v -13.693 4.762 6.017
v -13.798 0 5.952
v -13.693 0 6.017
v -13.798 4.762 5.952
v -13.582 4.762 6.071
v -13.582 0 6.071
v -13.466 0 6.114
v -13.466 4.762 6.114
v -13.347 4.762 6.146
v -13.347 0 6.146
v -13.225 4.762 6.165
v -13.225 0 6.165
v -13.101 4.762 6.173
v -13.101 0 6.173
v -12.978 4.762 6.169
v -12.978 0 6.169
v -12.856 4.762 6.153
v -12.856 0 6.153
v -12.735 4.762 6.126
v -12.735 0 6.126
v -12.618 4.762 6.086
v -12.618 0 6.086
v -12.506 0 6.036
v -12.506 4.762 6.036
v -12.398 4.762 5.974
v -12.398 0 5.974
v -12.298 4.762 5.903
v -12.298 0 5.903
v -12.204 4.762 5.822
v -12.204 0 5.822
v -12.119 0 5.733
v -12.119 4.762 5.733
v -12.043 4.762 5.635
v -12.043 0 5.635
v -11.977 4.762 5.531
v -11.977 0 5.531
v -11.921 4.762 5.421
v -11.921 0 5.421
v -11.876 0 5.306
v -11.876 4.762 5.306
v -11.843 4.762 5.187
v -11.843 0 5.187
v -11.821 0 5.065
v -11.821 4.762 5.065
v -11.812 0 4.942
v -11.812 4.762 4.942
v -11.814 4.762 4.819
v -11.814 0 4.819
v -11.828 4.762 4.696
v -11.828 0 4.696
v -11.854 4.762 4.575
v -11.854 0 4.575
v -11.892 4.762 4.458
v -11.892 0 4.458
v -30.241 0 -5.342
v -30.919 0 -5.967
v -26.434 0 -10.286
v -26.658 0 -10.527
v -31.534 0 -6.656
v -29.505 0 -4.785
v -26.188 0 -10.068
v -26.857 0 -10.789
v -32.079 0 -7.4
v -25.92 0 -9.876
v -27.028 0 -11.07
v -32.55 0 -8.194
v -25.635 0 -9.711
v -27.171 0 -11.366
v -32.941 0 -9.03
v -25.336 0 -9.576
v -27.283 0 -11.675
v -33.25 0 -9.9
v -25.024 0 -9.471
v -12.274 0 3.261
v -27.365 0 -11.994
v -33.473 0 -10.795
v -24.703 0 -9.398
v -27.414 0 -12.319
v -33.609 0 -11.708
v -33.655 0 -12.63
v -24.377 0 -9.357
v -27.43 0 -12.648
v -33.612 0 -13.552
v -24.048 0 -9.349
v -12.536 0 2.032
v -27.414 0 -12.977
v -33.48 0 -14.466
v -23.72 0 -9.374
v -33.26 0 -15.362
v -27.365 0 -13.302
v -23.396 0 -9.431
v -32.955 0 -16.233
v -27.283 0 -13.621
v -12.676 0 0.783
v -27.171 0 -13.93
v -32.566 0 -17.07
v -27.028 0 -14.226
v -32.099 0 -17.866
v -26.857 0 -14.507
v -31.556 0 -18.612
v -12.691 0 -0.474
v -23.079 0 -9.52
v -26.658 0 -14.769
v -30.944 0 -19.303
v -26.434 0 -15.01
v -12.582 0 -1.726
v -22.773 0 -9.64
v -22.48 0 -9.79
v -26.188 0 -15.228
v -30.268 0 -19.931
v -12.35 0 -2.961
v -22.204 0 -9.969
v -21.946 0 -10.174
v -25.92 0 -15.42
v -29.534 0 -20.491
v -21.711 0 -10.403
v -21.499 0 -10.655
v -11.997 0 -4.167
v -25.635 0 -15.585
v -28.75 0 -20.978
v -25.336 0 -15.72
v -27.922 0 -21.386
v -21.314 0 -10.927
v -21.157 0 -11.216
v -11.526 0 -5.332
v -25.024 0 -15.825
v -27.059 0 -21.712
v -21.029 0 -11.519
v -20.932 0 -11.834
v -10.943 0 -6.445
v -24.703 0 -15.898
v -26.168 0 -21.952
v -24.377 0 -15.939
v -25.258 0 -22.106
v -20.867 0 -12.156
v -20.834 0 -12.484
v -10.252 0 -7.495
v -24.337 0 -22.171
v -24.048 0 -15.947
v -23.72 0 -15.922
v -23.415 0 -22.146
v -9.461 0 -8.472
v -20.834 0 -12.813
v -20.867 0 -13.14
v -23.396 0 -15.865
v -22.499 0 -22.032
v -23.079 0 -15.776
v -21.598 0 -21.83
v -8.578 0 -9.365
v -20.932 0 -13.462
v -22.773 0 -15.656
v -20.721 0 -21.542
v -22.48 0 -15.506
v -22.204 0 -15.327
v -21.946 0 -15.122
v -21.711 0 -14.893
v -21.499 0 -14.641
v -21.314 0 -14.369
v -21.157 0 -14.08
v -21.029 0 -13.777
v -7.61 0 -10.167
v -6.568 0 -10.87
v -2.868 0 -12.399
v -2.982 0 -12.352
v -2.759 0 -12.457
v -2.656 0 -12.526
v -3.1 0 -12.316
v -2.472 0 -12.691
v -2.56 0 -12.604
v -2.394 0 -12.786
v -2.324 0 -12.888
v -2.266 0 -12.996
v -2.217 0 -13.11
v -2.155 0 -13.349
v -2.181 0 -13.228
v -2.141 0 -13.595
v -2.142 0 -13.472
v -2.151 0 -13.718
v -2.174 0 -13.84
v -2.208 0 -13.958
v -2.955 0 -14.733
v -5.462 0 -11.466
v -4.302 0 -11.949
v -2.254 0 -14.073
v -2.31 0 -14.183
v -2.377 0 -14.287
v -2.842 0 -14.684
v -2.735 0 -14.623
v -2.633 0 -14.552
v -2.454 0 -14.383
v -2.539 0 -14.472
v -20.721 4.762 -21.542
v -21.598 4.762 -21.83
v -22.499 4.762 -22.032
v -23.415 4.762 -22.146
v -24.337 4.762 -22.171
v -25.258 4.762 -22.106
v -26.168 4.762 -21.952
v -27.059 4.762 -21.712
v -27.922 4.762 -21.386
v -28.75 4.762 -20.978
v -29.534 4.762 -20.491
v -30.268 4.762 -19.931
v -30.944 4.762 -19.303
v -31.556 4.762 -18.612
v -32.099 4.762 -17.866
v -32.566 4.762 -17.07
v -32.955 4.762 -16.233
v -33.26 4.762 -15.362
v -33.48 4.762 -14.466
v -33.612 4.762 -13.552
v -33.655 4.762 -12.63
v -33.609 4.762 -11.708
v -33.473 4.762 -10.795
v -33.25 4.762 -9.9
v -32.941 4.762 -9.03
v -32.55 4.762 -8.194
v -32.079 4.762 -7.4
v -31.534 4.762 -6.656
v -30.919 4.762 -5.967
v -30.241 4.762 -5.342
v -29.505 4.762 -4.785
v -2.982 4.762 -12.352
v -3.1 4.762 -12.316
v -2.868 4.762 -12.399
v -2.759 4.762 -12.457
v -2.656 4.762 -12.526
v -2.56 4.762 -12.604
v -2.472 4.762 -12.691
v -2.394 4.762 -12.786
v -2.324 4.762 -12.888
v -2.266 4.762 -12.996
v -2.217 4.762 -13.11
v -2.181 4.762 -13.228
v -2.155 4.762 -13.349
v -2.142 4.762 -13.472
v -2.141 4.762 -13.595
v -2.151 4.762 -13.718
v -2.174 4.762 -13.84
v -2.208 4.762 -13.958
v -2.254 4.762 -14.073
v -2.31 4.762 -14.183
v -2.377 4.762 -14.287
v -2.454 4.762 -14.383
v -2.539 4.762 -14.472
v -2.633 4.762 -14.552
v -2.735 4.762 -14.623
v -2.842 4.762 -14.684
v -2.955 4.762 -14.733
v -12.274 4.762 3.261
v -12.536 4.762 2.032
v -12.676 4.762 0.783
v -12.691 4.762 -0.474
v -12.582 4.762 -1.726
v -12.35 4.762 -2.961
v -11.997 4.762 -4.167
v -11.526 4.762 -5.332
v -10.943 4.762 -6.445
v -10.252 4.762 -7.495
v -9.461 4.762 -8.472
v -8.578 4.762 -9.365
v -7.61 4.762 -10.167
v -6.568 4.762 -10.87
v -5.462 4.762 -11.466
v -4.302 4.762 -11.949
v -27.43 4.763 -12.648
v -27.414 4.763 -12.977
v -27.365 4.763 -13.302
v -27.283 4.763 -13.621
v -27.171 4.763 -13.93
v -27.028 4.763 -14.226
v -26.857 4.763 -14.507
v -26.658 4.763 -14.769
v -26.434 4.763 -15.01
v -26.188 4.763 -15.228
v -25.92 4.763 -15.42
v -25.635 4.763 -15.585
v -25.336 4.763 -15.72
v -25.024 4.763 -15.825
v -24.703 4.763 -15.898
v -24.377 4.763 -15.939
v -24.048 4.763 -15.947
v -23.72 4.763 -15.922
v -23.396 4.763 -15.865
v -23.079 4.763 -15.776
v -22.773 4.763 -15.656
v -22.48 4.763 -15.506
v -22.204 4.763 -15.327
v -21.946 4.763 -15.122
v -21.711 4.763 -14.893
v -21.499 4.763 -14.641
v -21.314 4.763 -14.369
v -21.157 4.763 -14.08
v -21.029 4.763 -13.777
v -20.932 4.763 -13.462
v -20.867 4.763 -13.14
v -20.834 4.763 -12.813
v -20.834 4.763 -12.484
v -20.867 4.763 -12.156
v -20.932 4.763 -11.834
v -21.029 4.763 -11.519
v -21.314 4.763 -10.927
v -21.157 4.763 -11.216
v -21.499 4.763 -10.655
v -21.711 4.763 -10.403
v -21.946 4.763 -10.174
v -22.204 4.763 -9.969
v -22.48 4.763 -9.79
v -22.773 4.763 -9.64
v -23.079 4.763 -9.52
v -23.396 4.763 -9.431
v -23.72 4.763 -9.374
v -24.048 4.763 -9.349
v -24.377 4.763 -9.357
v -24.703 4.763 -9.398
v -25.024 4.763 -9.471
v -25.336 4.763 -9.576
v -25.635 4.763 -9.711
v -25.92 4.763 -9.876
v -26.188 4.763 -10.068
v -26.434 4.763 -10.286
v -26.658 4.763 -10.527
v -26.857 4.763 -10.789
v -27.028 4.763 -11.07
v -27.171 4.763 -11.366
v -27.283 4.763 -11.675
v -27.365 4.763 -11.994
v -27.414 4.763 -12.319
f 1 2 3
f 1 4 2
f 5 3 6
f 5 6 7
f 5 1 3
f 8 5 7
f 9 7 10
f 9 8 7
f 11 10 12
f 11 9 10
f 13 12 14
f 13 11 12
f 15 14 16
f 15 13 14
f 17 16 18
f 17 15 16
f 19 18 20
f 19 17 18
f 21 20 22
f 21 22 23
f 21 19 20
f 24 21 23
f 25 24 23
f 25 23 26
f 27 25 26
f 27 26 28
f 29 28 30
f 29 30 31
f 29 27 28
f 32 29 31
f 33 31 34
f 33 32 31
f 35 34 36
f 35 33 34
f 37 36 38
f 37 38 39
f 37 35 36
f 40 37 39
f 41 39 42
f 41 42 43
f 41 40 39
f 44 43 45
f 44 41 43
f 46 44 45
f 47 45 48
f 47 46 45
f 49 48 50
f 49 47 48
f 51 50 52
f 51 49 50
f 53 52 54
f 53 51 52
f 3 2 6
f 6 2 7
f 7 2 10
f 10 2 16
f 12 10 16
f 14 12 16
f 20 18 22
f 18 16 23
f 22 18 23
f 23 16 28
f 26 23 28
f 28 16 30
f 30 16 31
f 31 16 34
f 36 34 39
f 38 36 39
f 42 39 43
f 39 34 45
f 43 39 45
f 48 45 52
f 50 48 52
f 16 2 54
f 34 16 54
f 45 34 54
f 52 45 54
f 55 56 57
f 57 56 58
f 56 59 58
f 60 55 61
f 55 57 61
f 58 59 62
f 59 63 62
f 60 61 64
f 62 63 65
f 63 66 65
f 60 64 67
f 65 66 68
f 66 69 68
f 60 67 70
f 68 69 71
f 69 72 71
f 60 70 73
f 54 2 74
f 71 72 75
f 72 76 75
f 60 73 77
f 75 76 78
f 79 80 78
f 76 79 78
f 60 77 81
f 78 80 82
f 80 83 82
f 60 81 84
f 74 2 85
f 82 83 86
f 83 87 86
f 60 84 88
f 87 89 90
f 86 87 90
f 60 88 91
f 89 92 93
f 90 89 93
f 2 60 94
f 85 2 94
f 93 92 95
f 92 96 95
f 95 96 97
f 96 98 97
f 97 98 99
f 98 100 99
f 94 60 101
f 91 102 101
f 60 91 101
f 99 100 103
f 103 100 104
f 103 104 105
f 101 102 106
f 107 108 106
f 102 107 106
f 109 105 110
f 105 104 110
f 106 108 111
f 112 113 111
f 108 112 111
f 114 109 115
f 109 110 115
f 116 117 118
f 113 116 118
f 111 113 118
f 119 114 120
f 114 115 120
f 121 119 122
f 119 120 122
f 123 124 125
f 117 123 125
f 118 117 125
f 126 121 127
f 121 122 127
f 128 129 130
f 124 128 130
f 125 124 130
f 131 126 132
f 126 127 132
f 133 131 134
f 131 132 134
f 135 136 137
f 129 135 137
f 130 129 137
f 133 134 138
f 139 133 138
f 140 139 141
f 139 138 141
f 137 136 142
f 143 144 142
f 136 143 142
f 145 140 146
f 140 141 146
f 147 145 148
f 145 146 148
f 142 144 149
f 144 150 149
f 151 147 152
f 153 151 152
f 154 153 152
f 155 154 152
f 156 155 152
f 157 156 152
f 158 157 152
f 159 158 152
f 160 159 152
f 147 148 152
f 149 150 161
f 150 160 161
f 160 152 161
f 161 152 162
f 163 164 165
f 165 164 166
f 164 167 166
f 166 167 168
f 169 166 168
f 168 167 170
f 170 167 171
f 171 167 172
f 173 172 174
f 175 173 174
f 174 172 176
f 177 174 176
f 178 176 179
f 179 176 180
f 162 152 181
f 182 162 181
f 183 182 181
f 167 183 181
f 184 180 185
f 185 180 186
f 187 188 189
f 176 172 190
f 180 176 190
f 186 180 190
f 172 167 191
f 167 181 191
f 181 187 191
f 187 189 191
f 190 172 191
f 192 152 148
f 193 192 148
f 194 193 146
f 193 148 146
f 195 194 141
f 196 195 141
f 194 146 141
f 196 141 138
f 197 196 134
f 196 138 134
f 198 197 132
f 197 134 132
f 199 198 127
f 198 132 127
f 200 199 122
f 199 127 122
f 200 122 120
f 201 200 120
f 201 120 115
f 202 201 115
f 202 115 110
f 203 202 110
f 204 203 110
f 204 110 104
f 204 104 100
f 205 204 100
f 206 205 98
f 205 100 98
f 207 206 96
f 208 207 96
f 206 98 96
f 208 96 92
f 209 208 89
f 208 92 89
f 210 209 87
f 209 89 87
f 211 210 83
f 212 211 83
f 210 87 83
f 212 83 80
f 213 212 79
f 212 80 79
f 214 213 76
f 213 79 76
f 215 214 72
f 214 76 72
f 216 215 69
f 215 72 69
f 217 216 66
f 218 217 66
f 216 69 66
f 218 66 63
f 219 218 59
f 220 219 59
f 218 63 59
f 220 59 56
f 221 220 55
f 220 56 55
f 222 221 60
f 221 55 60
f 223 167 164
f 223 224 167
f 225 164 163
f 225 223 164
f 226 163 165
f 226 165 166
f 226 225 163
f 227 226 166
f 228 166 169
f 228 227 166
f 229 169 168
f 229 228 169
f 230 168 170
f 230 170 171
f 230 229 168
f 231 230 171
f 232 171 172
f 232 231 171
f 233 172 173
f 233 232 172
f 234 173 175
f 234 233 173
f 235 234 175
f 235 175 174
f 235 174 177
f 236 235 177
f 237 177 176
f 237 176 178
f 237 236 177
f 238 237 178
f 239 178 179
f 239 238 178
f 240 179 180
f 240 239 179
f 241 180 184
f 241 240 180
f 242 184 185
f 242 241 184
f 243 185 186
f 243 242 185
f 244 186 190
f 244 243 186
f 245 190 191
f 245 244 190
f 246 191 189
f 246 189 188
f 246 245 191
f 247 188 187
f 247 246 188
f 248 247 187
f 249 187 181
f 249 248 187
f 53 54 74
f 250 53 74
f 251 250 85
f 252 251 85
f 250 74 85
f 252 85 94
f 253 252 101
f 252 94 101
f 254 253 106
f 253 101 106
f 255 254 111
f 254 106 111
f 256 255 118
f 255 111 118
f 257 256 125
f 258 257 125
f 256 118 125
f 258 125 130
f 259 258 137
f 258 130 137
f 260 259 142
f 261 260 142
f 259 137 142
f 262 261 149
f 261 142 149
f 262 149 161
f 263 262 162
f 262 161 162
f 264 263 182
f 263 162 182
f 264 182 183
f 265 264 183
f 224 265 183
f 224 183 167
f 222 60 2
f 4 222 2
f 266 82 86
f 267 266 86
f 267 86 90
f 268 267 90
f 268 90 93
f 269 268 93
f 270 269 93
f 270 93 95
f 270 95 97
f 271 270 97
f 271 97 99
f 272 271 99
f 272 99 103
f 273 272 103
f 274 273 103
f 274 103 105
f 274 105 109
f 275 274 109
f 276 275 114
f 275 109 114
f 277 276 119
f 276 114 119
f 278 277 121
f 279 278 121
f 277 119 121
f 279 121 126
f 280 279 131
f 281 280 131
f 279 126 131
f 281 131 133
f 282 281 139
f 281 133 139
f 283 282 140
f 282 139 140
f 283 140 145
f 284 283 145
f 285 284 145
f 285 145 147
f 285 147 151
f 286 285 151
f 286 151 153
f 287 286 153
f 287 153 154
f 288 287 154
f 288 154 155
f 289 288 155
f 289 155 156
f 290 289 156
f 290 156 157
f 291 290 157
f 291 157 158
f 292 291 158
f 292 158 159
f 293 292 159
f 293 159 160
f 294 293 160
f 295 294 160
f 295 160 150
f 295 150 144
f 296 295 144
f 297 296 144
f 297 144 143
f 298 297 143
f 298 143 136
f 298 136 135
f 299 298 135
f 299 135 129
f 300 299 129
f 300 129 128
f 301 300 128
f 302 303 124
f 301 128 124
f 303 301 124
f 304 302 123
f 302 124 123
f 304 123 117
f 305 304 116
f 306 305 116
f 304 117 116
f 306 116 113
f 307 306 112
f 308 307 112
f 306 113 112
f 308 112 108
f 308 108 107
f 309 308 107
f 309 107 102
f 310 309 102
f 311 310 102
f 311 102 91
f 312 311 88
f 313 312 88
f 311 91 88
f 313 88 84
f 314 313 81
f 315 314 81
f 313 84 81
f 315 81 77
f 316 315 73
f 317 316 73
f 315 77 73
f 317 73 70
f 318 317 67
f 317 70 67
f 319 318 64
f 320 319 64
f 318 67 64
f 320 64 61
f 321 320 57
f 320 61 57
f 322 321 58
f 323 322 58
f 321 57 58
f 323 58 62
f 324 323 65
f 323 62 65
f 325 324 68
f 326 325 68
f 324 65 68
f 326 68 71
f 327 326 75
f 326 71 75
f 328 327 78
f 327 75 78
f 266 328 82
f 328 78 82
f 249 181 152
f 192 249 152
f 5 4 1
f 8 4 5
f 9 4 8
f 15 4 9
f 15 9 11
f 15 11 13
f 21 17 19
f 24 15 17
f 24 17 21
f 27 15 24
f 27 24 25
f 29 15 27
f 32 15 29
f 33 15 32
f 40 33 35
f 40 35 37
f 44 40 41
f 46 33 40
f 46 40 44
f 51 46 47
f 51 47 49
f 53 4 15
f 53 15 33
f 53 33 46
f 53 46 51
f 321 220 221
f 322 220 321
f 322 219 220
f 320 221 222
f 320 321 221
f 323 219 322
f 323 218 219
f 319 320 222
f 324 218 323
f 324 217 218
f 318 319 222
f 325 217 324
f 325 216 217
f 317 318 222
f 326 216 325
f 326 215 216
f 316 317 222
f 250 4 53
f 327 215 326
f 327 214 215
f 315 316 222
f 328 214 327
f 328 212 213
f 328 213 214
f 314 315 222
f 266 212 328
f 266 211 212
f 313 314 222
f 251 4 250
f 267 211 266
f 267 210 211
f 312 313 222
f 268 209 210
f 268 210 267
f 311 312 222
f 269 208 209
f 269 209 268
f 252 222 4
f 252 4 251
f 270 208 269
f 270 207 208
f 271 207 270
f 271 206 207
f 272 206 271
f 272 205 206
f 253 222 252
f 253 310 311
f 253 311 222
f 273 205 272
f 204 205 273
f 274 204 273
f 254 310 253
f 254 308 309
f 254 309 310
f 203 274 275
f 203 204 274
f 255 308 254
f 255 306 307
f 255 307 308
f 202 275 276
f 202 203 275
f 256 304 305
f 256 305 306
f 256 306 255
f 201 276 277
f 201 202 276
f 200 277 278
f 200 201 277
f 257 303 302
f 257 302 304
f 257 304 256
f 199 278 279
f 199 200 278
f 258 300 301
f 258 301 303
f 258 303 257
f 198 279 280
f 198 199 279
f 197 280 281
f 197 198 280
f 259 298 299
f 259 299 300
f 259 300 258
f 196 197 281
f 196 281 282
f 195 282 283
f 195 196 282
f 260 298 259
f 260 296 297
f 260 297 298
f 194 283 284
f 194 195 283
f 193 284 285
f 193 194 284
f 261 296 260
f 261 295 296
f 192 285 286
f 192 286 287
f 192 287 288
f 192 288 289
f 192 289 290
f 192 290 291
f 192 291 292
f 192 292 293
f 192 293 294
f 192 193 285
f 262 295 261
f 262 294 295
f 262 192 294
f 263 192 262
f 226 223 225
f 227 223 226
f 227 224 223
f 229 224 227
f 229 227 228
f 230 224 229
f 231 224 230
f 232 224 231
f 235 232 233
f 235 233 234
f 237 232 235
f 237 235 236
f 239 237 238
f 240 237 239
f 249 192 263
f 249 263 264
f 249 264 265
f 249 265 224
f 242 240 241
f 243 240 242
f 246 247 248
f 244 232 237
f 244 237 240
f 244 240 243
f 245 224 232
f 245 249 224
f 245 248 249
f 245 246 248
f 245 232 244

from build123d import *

# Parameters (mm, degrees)
BOSS_EXTRUDE1_DEPTH  = 4.7625
FILLET1_R            = 1.27
M6_CLEARANCE_HOLE1_D = 6.6


with BuildPart() as part:
    # Sketch1 → Boss-Extrude1 (new body)
    with BuildSketch(Plane(origin=(0, 0, 0), x_dir=(1, 0, 0), z_dir=(0, 1, 0))):
        with BuildLine():
            Line((-29.505035319724954, 4.784524777155699), (-7.166713759633276, -10.484665654539652))
            ThreePointArc((-7.166713759633276, -10.484665654539652), (-11.24843137291464, 5.895997934941107), (4.544931572497542, 11.8589037014943))
            Line((4.544931572497542, 11.8589037014943), (-20.721301320626843, 21.542201794181164))
            ThreePointArc((-20.721301320626843, 21.542201794181164), (-32.56632352968598, 17.07002246926627), (-29.505035319724954, 4.784524777155699))
        make_face()
    extrude(amount=BOSS_EXTRUDE1_DEPTH)

    # Fillet1
    fillet1_edges = [part.edges().sort_by_distance(p)[0] for p in [
        (4.544931572497541, 2.38125, -11.858903701494302),
        (-7.166713759633276, 2.38125, 10.484665654539652),
    ]]
    fillet(fillet1_edges, radius=FILLET1_R)

    # M6 Clearance Hole1 (through all)
    with Locations(Plane(origin=(0, 4.7625, 0), x_dir=(1, 0, 0), z_dir=(0, 1, 0))):
        with Locations((-24.13, 12.648024018)):
            Hole(M6_CLEARANCE_HOLE1_D / 2)


solid = part.part
